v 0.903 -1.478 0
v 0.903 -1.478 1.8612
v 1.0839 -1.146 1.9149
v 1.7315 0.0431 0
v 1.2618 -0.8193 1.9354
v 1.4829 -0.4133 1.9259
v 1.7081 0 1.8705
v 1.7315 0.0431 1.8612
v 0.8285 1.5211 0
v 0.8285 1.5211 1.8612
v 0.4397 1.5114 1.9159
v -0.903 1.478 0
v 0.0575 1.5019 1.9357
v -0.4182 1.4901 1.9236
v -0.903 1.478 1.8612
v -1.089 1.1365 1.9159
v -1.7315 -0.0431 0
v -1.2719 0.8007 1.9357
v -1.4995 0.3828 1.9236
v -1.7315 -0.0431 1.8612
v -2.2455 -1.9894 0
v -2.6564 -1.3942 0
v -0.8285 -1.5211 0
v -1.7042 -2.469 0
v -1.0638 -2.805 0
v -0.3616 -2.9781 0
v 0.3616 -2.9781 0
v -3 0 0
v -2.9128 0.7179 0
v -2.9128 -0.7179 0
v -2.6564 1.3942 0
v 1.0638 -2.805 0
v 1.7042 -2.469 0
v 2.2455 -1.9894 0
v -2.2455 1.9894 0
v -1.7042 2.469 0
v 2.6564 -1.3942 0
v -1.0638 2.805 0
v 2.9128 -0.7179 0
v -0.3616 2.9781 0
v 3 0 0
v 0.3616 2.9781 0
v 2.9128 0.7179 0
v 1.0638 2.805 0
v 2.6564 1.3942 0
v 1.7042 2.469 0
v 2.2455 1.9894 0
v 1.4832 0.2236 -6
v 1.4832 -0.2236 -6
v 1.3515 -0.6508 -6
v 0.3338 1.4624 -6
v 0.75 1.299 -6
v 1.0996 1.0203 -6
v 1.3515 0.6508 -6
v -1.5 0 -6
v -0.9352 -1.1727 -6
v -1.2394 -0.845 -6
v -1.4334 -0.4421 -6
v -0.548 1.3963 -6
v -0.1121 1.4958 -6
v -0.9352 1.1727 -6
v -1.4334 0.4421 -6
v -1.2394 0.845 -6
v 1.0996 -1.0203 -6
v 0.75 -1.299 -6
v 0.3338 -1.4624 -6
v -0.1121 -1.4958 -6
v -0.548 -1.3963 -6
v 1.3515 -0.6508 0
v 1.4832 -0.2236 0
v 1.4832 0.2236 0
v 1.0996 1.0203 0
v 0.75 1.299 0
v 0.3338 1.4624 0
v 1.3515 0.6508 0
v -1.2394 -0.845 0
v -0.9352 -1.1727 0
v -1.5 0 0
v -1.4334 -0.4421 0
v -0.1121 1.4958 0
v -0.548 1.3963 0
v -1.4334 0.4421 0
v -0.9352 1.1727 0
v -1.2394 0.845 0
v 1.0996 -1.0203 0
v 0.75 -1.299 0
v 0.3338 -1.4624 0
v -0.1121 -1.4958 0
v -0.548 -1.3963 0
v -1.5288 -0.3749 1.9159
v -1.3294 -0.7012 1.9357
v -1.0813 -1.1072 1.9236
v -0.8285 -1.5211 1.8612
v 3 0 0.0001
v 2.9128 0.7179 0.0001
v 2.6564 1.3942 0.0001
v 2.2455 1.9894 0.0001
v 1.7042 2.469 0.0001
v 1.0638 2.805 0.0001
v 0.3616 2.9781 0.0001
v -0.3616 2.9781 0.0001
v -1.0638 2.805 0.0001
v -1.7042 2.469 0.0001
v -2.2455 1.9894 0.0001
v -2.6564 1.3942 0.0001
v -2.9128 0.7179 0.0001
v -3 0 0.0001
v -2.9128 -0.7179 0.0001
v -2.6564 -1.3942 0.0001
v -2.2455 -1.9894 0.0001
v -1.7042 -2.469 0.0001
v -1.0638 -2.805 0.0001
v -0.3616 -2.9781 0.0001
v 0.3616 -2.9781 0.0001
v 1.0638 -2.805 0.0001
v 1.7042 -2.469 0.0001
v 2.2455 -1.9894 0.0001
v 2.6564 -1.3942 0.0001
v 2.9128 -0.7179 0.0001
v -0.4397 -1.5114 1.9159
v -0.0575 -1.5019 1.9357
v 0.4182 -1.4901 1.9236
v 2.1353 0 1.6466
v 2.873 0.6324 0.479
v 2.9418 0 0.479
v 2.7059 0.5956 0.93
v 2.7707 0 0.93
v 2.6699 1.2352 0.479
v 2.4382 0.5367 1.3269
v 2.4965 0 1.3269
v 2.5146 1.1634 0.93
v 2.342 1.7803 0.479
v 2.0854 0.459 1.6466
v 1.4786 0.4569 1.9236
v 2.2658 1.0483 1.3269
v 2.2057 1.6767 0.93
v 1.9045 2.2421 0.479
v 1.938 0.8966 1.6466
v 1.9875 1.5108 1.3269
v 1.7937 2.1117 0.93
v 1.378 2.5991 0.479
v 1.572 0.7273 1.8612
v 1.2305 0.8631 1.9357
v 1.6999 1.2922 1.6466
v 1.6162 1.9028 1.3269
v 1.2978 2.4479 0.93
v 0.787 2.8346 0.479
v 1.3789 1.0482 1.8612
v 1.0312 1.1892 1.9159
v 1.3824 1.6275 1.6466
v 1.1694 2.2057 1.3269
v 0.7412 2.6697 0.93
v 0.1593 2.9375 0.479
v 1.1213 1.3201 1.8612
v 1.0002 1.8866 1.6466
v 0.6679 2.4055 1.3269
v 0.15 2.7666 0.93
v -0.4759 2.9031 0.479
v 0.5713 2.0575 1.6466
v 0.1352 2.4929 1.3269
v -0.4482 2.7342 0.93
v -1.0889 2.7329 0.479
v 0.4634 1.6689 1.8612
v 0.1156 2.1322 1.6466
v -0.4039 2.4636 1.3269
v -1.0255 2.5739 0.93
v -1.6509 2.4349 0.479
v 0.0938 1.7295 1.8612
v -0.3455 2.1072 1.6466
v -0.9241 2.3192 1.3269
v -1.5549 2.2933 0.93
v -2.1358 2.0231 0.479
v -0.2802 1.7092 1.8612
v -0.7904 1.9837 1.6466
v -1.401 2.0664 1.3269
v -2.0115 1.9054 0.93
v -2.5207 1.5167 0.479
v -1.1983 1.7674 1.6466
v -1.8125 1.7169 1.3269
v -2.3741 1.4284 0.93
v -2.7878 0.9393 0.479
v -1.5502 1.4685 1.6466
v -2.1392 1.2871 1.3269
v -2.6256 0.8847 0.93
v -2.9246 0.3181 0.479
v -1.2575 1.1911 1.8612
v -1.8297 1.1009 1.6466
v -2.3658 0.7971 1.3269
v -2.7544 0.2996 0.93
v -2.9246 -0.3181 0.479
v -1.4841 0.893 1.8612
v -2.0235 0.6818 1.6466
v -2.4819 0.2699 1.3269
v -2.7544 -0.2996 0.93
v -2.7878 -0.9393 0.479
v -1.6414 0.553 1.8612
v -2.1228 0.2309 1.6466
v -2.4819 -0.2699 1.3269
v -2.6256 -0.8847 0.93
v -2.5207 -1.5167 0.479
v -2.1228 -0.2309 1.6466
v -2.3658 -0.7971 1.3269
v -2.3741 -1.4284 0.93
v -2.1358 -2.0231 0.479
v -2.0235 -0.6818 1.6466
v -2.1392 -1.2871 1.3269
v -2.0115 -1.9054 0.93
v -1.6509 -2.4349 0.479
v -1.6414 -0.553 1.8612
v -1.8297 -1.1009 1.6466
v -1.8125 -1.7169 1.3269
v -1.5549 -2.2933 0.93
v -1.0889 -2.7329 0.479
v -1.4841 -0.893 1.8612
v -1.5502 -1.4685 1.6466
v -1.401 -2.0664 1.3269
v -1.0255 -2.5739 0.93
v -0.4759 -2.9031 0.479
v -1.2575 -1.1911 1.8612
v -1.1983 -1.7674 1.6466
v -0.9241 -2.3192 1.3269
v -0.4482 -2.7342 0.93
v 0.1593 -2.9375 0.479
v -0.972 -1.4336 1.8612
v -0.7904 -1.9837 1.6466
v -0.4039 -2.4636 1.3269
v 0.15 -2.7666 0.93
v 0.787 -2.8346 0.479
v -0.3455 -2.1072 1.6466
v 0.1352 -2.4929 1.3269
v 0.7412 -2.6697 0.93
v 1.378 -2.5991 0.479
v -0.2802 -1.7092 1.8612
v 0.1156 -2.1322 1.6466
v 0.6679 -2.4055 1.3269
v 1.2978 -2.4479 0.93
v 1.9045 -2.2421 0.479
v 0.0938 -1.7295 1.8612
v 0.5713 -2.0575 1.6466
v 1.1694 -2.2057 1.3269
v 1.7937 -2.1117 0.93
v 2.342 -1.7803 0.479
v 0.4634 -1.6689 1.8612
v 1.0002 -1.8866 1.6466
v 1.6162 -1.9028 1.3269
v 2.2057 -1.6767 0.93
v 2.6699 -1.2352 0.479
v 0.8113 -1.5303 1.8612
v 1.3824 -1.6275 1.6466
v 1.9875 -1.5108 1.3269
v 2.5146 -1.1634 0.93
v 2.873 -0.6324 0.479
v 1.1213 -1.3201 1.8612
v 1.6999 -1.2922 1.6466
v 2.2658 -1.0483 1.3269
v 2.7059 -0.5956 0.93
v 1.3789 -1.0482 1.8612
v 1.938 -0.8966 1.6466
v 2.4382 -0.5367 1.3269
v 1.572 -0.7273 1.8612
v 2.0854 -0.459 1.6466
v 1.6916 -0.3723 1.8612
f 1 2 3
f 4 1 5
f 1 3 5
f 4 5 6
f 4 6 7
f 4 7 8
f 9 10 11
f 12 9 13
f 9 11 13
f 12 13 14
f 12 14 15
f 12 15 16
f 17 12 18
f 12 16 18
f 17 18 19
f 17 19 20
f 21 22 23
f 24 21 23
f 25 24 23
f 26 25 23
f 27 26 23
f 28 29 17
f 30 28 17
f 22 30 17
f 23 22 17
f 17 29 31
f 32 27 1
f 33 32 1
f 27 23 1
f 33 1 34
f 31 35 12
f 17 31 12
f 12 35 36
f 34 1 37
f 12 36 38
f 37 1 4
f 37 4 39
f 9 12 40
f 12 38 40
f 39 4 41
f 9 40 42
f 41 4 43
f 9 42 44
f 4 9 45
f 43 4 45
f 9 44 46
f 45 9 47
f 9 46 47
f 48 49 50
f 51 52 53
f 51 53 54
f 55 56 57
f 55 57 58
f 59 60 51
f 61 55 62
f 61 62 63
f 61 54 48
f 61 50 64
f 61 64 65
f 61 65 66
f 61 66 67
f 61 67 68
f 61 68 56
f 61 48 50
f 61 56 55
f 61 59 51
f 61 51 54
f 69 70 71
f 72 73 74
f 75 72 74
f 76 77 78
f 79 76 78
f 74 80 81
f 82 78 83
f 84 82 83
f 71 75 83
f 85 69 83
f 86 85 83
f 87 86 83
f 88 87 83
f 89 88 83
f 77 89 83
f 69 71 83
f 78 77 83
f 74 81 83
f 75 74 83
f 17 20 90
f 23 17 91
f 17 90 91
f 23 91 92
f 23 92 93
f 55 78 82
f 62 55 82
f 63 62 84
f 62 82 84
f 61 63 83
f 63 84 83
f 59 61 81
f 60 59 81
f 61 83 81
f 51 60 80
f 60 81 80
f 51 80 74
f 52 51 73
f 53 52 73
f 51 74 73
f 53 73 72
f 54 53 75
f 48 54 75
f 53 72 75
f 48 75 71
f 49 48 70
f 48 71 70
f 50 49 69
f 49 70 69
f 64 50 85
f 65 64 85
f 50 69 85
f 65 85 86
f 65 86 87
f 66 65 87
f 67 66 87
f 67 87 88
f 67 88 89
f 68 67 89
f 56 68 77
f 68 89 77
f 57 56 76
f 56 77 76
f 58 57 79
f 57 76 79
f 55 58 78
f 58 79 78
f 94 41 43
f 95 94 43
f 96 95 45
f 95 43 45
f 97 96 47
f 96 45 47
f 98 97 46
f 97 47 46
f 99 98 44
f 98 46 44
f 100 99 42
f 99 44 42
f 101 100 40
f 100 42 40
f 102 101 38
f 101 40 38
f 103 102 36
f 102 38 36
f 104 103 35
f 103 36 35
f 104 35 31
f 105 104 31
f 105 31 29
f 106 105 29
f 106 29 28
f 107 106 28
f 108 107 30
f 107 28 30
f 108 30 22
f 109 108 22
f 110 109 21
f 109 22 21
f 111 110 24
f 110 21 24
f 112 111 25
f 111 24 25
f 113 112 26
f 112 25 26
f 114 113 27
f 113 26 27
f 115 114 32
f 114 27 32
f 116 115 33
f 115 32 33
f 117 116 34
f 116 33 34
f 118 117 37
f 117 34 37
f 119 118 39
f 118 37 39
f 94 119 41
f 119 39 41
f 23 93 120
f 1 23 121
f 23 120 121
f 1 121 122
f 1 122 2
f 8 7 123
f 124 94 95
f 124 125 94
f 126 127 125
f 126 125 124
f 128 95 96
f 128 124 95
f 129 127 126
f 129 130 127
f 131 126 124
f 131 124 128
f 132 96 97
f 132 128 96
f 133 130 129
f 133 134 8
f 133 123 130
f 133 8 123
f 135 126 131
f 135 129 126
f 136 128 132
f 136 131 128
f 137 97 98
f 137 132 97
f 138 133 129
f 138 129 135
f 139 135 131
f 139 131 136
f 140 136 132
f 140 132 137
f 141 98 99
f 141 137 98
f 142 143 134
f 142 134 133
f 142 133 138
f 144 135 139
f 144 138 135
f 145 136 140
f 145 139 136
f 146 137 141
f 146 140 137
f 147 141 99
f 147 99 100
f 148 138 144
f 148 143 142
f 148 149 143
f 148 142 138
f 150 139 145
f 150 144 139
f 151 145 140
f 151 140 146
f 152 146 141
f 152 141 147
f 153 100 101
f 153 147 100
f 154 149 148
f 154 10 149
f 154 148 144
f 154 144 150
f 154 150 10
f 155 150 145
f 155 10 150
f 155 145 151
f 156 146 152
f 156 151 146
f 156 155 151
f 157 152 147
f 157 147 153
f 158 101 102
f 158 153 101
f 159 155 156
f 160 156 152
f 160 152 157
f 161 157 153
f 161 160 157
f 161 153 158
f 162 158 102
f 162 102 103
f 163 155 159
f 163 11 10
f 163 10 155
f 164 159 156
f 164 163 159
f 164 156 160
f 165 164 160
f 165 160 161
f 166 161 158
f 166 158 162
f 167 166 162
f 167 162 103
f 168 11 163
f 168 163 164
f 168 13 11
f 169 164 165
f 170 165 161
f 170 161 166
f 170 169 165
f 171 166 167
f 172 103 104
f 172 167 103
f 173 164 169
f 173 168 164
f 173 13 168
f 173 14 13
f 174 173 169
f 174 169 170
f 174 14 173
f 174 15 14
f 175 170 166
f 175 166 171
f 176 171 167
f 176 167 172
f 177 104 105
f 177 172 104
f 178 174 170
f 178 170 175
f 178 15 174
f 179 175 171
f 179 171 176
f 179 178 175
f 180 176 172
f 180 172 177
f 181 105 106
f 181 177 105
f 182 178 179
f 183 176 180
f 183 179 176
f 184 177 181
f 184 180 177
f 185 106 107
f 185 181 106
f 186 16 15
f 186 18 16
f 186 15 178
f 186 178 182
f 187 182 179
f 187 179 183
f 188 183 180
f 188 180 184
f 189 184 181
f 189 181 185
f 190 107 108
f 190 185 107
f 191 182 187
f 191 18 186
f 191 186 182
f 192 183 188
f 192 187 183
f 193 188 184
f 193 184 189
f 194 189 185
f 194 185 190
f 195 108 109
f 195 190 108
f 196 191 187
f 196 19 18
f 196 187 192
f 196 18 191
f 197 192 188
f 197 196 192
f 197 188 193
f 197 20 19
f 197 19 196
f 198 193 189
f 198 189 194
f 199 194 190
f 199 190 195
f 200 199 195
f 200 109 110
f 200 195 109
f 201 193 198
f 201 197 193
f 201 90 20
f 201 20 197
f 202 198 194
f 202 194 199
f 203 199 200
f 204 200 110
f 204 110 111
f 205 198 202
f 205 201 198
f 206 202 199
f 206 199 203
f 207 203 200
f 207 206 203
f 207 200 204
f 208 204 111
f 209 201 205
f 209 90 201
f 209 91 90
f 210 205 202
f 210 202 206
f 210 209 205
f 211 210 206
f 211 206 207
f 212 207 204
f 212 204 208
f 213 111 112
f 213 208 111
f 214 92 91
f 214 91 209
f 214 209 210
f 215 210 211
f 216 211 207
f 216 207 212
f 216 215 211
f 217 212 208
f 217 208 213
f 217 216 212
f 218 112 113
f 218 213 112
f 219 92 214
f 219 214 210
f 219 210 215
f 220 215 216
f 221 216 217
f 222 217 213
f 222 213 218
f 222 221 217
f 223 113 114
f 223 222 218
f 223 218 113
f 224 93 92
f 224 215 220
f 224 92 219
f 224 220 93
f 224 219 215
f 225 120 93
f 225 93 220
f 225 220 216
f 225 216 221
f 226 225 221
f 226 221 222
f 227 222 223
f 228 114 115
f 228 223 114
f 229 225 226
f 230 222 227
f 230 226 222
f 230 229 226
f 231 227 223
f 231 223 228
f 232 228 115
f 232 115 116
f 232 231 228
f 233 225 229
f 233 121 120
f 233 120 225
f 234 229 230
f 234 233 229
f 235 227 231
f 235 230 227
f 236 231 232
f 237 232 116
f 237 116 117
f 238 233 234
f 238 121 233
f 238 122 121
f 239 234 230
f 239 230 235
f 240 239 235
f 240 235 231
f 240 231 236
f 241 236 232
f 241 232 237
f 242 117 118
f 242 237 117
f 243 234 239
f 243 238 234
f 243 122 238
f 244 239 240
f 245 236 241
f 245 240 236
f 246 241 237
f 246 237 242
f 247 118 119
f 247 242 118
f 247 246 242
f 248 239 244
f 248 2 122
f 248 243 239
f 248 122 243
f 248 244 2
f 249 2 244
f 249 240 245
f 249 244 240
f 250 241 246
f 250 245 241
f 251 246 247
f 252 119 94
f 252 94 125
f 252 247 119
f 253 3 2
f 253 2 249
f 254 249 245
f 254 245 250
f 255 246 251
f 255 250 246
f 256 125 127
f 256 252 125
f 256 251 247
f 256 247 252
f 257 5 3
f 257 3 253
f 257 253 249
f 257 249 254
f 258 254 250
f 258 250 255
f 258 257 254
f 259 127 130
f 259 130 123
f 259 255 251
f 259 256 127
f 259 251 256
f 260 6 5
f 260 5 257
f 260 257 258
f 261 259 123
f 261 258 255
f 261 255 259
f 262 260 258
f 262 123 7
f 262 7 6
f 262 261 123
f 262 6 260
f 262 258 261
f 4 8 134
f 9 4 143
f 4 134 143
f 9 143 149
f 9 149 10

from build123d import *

# Parameters (mm, degrees)
SKETCH1_R           = 3
BOSS_EXTRUDE1_DEPTH = 2
FILLET1_R           = 2
CUT_EXTRUDE1_DEPTH  = 2
SKETCH3_R           = 1.5
BOSS_EXTRUDE2_DEPTH = 6


with BuildPart() as part:
    # Sketch1 → Boss-Extrude1 (new body)
    with BuildSketch(Plane.XY):
        Circle(SKETCH1_R)
    extrude(amount=BOSS_EXTRUDE1_DEPTH)

    # Fillet1
    fillet1_edges = [part.edges().sort_by_distance(p)[0] for p in [
        (-3, 0, 2),
    ]]
    fillet(fillet1_edges, radius=FILLET1_R - 0.0001)  # a hair under: the kernel refuses the full size

    # Sketch2 → Cut-Extrude1 (cut)
    with BuildSketch(Plane.XY.offset(2)):
        Polygon((0.903043901, -1.478009375), (1.731515616, 0.043054272), (0.828471715, 1.521063647), (-0.903043901, 1.478009375), (-1.731515616, -0.043054272), (-0.828471715, -1.521063647), align=None)
    extrude(amount=-CUT_EXTRUDE1_DEPTH, mode=Mode.SUBTRACT)


with BuildPart() as body_2:
    # Sketch3 → Boss-Extrude2 (new body)
    with BuildSketch(Plane(origin=(0, 0, 0), x_dir=(-1, 0, 0), z_dir=(0, 0, -1))):
        Circle(SKETCH3_R)
    extrude(amount=BOSS_EXTRUDE2_DEPTH)


solid = Compound([part.part, body_2.part])
